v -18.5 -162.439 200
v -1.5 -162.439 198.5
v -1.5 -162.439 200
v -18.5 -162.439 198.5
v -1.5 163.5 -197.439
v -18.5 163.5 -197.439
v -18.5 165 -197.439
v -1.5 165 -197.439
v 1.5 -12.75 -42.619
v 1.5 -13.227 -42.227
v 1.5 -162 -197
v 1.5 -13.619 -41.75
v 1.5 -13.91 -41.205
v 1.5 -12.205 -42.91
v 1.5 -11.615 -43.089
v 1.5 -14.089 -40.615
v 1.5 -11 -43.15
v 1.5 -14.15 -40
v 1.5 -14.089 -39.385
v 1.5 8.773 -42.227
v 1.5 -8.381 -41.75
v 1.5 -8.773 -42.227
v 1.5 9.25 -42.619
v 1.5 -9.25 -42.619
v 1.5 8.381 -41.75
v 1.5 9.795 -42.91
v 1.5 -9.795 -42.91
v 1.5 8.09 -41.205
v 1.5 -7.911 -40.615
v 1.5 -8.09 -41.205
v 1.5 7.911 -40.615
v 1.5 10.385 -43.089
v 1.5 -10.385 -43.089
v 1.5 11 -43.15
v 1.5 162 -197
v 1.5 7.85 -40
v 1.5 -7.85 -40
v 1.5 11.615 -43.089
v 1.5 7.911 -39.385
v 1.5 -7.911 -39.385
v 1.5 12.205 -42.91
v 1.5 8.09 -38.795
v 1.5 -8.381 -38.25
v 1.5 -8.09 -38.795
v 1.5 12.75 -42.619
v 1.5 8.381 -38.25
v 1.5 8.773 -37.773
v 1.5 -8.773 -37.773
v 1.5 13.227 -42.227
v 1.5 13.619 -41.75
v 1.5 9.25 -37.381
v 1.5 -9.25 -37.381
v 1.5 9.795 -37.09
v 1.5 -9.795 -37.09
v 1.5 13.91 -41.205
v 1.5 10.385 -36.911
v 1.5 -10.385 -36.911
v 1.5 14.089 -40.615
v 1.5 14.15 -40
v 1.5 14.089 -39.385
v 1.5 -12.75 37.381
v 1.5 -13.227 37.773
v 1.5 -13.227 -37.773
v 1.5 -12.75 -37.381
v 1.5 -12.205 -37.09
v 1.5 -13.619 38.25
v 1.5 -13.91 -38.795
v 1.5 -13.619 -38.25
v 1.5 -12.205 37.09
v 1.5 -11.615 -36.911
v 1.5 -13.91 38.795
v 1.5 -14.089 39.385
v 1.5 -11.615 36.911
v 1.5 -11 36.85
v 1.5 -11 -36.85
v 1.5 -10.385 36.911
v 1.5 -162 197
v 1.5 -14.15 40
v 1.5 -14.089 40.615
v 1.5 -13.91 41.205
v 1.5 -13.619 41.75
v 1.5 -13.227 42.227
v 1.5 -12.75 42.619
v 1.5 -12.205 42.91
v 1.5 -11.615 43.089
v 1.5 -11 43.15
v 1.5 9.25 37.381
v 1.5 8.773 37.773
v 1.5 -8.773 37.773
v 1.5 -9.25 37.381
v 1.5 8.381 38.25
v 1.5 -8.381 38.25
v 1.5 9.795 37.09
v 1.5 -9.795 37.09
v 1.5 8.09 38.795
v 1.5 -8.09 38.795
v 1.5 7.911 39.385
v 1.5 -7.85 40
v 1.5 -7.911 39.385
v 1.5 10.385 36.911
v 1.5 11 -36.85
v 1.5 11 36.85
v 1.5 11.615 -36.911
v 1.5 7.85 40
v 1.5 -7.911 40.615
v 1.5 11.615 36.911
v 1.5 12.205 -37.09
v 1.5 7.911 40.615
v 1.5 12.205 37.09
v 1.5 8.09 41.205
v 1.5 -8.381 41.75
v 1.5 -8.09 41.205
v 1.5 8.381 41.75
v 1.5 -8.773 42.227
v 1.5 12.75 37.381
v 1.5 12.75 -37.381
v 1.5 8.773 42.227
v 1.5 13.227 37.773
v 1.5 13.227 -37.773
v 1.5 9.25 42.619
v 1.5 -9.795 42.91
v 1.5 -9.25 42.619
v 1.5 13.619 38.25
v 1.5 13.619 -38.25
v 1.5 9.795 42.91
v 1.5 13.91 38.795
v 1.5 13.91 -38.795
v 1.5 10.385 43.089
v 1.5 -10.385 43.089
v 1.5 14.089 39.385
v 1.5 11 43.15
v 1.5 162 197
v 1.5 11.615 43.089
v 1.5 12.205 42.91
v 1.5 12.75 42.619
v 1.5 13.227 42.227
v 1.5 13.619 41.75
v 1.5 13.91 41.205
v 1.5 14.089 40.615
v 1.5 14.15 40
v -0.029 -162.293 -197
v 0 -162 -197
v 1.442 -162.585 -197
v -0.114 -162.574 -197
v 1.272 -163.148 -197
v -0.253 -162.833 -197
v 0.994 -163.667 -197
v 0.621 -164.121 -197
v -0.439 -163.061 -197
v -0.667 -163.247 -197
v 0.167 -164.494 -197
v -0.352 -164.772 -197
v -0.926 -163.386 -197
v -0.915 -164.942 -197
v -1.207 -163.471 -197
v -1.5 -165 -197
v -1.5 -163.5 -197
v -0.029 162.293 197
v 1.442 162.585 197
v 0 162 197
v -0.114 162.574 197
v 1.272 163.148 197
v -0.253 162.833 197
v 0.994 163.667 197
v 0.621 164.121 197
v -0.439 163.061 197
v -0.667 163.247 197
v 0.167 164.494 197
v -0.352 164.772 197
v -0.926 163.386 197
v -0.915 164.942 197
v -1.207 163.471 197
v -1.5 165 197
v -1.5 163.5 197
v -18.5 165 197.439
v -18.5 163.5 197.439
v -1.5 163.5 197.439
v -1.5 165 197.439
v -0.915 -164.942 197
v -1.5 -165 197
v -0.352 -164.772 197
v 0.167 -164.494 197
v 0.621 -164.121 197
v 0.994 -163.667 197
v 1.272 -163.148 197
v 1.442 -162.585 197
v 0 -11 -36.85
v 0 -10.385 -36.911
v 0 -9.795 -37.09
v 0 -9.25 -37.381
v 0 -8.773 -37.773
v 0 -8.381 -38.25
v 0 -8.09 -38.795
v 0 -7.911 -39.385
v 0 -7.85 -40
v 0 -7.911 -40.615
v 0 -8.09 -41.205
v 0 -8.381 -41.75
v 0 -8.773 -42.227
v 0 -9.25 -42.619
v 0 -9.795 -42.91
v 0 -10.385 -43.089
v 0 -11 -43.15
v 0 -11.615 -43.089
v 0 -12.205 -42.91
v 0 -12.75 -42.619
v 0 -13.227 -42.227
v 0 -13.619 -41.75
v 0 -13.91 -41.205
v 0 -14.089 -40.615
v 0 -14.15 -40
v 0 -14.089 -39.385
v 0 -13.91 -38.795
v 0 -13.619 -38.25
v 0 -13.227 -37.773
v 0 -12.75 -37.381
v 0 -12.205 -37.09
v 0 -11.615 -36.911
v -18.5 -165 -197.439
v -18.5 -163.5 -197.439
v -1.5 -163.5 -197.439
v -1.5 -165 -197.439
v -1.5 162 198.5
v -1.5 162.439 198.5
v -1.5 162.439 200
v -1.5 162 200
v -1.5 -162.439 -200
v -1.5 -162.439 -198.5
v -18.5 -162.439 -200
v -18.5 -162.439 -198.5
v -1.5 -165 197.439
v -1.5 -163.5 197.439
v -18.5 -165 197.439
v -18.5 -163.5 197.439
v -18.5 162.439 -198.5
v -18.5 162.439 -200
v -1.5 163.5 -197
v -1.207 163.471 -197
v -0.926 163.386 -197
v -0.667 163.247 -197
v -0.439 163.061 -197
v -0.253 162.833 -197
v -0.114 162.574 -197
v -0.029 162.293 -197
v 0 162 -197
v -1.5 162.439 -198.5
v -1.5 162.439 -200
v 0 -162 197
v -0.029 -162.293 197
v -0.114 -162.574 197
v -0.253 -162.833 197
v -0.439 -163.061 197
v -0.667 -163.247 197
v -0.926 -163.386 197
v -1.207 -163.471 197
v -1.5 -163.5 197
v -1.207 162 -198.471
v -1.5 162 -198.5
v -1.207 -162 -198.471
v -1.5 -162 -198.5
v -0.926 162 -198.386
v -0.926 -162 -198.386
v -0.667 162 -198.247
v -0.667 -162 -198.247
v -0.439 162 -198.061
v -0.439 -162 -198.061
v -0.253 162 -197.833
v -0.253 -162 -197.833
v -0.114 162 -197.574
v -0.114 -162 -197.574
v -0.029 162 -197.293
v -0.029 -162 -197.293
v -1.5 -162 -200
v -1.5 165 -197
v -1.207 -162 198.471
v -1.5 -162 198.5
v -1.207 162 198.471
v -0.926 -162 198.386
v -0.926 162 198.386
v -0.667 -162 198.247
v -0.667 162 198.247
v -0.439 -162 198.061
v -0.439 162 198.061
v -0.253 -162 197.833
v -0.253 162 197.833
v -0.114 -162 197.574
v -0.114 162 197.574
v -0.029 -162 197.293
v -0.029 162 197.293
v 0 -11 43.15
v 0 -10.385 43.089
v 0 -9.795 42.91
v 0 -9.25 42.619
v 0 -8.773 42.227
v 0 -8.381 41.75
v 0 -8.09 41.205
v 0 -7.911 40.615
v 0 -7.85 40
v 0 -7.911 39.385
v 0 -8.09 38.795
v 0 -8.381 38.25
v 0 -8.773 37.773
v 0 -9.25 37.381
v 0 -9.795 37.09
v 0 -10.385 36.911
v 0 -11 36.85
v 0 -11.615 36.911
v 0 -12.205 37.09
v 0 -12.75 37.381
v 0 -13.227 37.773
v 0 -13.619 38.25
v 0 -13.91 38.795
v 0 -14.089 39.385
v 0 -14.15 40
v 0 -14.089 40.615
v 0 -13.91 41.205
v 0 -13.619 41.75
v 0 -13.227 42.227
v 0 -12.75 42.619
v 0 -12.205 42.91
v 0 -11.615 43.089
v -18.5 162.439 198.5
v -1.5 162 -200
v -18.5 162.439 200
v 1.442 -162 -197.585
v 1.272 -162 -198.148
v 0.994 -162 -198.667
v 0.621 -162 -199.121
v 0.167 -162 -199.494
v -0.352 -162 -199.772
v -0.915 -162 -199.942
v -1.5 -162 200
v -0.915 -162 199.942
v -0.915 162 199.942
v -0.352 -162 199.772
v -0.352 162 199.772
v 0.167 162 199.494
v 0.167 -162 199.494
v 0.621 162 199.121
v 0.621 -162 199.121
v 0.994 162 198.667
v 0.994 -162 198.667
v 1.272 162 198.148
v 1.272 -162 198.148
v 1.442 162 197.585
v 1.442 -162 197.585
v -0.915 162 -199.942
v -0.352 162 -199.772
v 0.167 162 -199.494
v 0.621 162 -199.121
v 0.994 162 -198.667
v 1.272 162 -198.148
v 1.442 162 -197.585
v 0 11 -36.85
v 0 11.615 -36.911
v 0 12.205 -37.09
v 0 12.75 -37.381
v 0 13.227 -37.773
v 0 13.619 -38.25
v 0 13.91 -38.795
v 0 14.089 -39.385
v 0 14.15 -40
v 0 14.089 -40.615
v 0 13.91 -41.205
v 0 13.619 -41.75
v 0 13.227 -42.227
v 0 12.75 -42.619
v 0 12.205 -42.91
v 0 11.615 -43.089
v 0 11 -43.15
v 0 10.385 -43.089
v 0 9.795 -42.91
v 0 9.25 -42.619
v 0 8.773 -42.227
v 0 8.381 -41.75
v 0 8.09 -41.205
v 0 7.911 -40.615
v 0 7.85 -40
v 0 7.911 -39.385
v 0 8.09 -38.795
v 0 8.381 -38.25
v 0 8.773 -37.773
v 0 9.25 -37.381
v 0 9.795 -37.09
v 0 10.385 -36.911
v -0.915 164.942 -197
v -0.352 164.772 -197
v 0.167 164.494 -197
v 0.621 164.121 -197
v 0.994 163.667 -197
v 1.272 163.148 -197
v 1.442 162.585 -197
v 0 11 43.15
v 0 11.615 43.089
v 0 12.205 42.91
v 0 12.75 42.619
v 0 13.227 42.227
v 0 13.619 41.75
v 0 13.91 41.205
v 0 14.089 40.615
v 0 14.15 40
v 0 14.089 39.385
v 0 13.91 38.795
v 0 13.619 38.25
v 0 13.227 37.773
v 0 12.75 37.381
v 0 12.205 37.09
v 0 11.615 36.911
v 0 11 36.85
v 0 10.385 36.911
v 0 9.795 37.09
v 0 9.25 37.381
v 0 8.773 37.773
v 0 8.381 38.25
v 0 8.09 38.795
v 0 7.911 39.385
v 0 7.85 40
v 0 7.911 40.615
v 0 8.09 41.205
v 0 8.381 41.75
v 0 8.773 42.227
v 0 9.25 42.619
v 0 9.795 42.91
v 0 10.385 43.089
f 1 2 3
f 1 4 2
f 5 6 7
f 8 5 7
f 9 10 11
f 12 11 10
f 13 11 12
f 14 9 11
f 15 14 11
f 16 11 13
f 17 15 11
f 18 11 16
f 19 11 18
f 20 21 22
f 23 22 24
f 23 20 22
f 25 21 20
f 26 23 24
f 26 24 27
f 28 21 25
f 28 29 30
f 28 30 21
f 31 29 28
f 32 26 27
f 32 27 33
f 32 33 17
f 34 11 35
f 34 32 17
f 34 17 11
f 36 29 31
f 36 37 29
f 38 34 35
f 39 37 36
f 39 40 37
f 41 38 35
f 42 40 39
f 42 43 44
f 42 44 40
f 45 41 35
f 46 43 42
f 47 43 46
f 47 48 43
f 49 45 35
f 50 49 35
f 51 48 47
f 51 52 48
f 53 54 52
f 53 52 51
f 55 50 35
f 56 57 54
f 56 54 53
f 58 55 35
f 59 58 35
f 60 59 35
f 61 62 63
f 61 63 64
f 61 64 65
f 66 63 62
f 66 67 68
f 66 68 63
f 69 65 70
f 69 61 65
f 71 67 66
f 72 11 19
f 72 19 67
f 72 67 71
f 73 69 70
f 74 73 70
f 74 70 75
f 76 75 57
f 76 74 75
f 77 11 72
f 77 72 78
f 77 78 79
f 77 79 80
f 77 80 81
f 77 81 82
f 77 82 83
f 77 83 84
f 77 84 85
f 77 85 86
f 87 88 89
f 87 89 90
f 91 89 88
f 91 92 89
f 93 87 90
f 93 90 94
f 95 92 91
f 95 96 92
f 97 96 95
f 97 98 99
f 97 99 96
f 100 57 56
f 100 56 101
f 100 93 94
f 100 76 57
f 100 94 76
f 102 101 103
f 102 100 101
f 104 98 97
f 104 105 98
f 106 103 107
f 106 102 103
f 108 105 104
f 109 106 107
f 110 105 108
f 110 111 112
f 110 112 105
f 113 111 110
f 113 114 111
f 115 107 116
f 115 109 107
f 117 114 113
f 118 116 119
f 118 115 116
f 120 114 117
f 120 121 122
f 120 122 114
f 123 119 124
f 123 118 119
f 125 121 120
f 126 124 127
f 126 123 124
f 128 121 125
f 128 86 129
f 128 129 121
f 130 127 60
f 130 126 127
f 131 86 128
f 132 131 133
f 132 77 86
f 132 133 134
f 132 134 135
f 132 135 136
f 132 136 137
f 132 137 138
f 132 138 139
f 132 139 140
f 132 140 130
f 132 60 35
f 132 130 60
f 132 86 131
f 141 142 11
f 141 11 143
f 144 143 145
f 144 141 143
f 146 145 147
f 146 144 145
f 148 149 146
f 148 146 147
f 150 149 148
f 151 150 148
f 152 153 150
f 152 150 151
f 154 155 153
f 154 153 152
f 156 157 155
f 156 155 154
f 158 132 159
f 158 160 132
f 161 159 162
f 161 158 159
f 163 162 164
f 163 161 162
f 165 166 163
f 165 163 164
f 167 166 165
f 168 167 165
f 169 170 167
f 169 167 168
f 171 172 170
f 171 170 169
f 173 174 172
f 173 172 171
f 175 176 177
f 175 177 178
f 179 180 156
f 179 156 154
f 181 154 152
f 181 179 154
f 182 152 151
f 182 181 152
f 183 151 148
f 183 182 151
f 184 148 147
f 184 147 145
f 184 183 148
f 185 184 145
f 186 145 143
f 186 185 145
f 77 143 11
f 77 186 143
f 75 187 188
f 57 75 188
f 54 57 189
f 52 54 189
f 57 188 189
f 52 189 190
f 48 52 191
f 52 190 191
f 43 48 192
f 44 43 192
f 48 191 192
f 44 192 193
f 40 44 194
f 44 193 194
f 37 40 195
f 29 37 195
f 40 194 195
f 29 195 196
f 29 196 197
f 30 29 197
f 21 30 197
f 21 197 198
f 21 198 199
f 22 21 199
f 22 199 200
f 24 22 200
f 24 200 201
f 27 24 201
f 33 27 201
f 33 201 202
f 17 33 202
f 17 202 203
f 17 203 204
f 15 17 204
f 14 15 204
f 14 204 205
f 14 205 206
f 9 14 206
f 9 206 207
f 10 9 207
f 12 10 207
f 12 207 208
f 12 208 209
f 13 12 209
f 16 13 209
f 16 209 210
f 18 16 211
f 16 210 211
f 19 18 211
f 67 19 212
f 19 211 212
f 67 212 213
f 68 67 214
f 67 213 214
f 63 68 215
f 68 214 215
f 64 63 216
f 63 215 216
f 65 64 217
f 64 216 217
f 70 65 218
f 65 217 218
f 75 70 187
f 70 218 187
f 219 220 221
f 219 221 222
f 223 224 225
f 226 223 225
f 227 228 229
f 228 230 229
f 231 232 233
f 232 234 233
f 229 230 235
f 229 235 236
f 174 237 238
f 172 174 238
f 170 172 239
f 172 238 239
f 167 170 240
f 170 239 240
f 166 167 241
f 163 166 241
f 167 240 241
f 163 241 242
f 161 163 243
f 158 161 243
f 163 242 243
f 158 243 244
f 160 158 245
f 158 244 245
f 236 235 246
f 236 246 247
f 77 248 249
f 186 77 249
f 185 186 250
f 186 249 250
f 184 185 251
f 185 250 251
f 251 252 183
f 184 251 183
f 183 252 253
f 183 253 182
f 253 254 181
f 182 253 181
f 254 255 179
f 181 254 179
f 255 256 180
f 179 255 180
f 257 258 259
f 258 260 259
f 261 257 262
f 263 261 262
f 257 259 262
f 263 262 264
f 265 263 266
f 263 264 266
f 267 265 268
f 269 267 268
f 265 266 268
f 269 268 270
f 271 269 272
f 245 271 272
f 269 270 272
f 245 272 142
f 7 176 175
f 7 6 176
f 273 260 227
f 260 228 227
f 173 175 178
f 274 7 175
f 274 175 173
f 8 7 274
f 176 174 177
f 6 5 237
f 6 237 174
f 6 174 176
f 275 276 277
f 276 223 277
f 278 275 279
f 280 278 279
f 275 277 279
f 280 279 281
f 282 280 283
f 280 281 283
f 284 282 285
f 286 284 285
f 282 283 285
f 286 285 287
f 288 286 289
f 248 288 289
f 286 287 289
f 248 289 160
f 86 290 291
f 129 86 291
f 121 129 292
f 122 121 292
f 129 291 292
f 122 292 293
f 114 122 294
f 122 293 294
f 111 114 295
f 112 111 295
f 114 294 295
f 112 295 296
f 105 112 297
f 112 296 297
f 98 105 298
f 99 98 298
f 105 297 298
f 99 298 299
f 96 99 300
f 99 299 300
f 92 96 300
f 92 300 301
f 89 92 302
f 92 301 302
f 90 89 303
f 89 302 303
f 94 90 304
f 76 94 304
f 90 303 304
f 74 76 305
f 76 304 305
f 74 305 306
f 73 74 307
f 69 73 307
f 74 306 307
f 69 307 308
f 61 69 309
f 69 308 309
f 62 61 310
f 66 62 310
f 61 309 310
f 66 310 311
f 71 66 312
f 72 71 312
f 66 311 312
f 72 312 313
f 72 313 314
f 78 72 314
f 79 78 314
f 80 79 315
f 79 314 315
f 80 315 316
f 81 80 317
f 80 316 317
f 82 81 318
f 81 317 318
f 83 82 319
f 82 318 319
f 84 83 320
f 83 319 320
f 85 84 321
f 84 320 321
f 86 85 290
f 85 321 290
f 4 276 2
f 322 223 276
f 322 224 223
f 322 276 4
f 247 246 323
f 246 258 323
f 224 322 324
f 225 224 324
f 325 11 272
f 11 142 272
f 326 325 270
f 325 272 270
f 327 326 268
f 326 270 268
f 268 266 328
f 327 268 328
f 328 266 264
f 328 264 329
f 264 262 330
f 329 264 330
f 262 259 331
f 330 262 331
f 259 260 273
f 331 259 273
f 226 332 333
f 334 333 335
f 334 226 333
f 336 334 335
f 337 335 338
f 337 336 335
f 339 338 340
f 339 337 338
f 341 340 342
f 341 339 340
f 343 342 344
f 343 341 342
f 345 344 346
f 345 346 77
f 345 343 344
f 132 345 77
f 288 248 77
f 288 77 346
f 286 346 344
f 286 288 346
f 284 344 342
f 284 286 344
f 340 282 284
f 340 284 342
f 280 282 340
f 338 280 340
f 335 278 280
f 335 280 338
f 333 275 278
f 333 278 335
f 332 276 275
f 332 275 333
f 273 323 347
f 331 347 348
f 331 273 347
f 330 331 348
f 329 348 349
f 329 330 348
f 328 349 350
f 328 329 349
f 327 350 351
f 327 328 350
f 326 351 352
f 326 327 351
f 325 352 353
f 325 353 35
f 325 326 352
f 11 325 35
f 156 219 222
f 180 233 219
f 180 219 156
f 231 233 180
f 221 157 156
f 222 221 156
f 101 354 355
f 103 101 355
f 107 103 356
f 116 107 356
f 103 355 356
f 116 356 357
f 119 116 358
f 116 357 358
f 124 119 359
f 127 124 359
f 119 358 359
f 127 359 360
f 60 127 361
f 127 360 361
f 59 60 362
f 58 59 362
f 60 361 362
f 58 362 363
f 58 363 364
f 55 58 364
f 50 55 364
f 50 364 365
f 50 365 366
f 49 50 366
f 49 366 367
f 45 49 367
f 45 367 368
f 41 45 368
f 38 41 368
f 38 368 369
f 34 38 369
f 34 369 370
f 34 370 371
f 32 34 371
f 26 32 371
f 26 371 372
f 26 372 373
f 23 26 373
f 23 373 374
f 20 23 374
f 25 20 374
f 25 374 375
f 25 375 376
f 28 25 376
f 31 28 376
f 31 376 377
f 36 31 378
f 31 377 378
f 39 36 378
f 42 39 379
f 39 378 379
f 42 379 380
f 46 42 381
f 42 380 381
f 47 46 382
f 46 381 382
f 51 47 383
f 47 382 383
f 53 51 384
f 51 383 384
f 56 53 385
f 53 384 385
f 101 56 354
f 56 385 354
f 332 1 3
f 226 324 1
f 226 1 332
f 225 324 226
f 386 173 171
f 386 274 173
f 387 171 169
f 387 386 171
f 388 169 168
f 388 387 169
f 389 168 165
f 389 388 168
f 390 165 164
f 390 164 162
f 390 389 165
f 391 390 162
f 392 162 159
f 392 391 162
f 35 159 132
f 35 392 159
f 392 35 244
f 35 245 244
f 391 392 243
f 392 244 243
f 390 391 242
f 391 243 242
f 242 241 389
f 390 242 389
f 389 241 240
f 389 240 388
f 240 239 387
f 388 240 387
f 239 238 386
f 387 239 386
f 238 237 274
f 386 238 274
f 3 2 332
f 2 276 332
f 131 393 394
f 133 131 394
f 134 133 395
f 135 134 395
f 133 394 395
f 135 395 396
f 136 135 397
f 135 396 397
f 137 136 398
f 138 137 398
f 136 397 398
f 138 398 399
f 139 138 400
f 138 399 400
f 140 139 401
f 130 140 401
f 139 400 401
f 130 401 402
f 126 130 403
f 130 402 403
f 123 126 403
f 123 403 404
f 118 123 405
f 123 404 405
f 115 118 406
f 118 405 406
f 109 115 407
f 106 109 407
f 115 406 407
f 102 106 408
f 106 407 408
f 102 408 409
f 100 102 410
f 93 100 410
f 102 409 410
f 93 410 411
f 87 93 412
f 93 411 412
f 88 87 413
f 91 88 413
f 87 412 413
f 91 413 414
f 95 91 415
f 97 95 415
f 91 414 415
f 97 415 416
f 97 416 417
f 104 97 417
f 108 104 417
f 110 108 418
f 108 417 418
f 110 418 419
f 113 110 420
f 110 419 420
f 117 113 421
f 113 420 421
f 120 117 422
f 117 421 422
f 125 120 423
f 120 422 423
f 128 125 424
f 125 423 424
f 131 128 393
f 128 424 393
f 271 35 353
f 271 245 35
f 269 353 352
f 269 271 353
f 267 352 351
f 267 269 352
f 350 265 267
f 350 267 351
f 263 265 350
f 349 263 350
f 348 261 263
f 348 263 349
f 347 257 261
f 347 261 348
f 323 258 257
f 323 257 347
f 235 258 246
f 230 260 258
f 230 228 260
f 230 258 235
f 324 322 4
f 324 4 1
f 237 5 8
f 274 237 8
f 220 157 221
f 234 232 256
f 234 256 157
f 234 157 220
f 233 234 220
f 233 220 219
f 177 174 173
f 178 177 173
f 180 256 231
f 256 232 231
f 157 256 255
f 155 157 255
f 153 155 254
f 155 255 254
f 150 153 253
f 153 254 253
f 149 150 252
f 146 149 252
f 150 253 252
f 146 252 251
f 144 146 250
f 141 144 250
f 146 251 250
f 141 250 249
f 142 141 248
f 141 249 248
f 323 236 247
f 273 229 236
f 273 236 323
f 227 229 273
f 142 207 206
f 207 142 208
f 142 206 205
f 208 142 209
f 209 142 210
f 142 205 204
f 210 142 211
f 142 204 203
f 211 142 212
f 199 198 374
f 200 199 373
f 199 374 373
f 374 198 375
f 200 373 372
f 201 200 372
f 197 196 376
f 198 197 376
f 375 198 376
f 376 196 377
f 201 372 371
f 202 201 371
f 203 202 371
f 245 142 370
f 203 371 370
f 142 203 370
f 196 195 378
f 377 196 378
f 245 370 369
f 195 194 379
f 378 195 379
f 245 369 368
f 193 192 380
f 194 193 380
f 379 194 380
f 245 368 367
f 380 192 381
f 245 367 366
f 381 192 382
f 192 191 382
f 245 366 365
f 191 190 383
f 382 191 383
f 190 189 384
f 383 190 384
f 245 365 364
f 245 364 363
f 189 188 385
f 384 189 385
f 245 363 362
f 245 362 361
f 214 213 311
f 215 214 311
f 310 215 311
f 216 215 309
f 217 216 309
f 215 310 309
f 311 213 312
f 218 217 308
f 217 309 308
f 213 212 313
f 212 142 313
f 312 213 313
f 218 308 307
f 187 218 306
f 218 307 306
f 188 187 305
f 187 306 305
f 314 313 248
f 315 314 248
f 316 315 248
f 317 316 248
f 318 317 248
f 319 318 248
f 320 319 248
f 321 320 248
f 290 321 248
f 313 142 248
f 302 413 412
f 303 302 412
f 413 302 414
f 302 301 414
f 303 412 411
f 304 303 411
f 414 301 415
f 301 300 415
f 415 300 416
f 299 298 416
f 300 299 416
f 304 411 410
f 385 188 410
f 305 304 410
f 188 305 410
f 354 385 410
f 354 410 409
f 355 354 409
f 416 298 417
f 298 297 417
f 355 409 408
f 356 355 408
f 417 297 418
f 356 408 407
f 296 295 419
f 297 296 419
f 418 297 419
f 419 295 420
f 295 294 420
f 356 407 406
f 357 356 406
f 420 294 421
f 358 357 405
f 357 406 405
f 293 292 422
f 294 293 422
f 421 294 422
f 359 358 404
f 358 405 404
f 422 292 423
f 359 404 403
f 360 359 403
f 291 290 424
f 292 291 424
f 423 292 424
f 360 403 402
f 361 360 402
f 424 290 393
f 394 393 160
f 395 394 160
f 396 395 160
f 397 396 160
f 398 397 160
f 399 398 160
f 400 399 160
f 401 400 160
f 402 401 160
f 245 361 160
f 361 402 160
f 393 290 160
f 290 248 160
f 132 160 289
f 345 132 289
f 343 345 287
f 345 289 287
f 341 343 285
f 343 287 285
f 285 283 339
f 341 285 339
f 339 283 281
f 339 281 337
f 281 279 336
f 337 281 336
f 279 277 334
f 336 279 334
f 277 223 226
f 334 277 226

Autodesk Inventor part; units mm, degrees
ref_plane "YZ Plane" through (0, 0, 0) normal (1, 0, 0) x (0, 1, 0)
ref_plane "XZ Plane" through (0, 0, 0) normal (0, 1, 0) x (-1, 0, 0)
ref_plane "XY Plane" through (0, 0, 0) normal (0, 0, 1) x (1, 0, 0)
sketch "Sketch1" plane through (0, 0, 0) normal (1, 0, 0) x (0, 1, 0)
  line L0 (165, 200) -> (-165, 200)
  line L1 (-165, 200) -> (-165, -200)
  line L2 (-165, -200) -> (165, -200)
  line L3 (165, -200) -> (165, 200)
  line L4 (165, 200) -> (-165, -200) construction
  line L5 (-165, 200) -> (165, -200) construction
  point P0 (0, 0)
  dimension "d0" = 330
  dimension "d1" = 400
extrude "Plate1" add sketch "Sketch1" along normal blind 1.5
sketch "Sketch2" plane through (1.5, 165, 198.5) normal (0, 0, 1) x (1, 0, 0)
  line L0 (0, -330) -> (0, 0)
  line L1 (0, 0) -> (-20, 0)
  line L2 (-20, 0) -> (-20, -330)
  line L3 (-20, -330) -> (0, -330)
edge flange "Flange1" height 20 angle 90 thickness 1.5 bend radius 1.5 thickness toward (0, 0, 1) relief tear relief width 1.5 relief depth 0.75 corner gap 1.5 corner form 2 edges at (0, 0, 200) (0, 165, 0) (0, 0, -200) (0, -165, 0) wall of the first edge with corners at (1.5, -165, 198.5) (1.5, 165, 198.5) (-18.5, 165, 198.5) (-18.5, -165, 198.5)
bend "Bend1"
corner "Corner1"
sketch "Sketch4" plane through (0, 0, 0) normal (-1, 0, 0) x (0, 0, 1)
  circle A0 centre (-40, 11) radius 3.15
  line L0 (0, 0) -> (-5.5711, 0)
  line L1 (0, 0) -> (-6.9523, 0)
  line L2 (0, 0) -> (0, 7.85)
  circle A1 centre (-40, -11) radius 3.15
  circle A2 centre (40, 11) radius 3.15
  circle A3 centre (40, -11) radius 3.15
  dimension "d21" = 6.3
  dimension "d22" = 40
  dimension "d23" = 11
extrude "Cut2" cut sketch "Sketch4" against normal blind 1.5
equation "\"d0\" = C_height"
equation "\"d1\" = C_length"
equation "\"d24\" = Thickness"
equation "\"d2\" = Thickness"
equation "\"d3\" = BendReliefWidth"
equation "\"d4\" = BendReliefDepth"
equation "\"d5\" = MinimumRemnant"
equation "\"d6\" = TransitionRadius"
equation "\"d7\" = C_width"
equation "\"d9\" = BendRadius"
equation "\"d10\" = CornerReliefSize"
equation "\"d11\" = GapSize"
equation "\"d12\" = JacobiRadiusSize"
equation "\"BendRadius\" = Thickness"
equation "\"BendReliefWidth\" = Thickness"
equation "\"BendReliefDepth\" = 0.5 * Thickness"
equation "\"CornerReliefSize\" = 4 * Thickness"
equation "\"MinimumRemnant\" = 2 * Thickness"
equation "\"TransitionRadius\" = BendRadius"
equation "\"JacobiRadiusSize\" = BendRadius"
equation "\"GapSize\" = Thickness"
equation "\"A_width\" = 46"
equation "\"A_joint_diameter\" = 16"
equation "\"A_joint_tolerance\" = 3"
equation "\"l___________\" = 0"
equation "\"l__________\" = 0"
equation "\"C_length\" = 400"
equation "\"C_height\" = 330"
equation "\"l_________\" = 0"
equation "\"rivet_diameter\" = 3.35"
equation "\"plate_thickness\" = 3"
equation "\"l________\" = 0"
equation "\"A_B_spacing\" = 2"
equation "\"L_Piston_Bottom\" = 21"
equation "\"L_Piston_Top\" = 25"
equation "\"thin_plate\" = 1.5"
equation "\"Thickness\" = 1.5"
equation "\"C_width\" = 20"
properties part number "C_plate"
